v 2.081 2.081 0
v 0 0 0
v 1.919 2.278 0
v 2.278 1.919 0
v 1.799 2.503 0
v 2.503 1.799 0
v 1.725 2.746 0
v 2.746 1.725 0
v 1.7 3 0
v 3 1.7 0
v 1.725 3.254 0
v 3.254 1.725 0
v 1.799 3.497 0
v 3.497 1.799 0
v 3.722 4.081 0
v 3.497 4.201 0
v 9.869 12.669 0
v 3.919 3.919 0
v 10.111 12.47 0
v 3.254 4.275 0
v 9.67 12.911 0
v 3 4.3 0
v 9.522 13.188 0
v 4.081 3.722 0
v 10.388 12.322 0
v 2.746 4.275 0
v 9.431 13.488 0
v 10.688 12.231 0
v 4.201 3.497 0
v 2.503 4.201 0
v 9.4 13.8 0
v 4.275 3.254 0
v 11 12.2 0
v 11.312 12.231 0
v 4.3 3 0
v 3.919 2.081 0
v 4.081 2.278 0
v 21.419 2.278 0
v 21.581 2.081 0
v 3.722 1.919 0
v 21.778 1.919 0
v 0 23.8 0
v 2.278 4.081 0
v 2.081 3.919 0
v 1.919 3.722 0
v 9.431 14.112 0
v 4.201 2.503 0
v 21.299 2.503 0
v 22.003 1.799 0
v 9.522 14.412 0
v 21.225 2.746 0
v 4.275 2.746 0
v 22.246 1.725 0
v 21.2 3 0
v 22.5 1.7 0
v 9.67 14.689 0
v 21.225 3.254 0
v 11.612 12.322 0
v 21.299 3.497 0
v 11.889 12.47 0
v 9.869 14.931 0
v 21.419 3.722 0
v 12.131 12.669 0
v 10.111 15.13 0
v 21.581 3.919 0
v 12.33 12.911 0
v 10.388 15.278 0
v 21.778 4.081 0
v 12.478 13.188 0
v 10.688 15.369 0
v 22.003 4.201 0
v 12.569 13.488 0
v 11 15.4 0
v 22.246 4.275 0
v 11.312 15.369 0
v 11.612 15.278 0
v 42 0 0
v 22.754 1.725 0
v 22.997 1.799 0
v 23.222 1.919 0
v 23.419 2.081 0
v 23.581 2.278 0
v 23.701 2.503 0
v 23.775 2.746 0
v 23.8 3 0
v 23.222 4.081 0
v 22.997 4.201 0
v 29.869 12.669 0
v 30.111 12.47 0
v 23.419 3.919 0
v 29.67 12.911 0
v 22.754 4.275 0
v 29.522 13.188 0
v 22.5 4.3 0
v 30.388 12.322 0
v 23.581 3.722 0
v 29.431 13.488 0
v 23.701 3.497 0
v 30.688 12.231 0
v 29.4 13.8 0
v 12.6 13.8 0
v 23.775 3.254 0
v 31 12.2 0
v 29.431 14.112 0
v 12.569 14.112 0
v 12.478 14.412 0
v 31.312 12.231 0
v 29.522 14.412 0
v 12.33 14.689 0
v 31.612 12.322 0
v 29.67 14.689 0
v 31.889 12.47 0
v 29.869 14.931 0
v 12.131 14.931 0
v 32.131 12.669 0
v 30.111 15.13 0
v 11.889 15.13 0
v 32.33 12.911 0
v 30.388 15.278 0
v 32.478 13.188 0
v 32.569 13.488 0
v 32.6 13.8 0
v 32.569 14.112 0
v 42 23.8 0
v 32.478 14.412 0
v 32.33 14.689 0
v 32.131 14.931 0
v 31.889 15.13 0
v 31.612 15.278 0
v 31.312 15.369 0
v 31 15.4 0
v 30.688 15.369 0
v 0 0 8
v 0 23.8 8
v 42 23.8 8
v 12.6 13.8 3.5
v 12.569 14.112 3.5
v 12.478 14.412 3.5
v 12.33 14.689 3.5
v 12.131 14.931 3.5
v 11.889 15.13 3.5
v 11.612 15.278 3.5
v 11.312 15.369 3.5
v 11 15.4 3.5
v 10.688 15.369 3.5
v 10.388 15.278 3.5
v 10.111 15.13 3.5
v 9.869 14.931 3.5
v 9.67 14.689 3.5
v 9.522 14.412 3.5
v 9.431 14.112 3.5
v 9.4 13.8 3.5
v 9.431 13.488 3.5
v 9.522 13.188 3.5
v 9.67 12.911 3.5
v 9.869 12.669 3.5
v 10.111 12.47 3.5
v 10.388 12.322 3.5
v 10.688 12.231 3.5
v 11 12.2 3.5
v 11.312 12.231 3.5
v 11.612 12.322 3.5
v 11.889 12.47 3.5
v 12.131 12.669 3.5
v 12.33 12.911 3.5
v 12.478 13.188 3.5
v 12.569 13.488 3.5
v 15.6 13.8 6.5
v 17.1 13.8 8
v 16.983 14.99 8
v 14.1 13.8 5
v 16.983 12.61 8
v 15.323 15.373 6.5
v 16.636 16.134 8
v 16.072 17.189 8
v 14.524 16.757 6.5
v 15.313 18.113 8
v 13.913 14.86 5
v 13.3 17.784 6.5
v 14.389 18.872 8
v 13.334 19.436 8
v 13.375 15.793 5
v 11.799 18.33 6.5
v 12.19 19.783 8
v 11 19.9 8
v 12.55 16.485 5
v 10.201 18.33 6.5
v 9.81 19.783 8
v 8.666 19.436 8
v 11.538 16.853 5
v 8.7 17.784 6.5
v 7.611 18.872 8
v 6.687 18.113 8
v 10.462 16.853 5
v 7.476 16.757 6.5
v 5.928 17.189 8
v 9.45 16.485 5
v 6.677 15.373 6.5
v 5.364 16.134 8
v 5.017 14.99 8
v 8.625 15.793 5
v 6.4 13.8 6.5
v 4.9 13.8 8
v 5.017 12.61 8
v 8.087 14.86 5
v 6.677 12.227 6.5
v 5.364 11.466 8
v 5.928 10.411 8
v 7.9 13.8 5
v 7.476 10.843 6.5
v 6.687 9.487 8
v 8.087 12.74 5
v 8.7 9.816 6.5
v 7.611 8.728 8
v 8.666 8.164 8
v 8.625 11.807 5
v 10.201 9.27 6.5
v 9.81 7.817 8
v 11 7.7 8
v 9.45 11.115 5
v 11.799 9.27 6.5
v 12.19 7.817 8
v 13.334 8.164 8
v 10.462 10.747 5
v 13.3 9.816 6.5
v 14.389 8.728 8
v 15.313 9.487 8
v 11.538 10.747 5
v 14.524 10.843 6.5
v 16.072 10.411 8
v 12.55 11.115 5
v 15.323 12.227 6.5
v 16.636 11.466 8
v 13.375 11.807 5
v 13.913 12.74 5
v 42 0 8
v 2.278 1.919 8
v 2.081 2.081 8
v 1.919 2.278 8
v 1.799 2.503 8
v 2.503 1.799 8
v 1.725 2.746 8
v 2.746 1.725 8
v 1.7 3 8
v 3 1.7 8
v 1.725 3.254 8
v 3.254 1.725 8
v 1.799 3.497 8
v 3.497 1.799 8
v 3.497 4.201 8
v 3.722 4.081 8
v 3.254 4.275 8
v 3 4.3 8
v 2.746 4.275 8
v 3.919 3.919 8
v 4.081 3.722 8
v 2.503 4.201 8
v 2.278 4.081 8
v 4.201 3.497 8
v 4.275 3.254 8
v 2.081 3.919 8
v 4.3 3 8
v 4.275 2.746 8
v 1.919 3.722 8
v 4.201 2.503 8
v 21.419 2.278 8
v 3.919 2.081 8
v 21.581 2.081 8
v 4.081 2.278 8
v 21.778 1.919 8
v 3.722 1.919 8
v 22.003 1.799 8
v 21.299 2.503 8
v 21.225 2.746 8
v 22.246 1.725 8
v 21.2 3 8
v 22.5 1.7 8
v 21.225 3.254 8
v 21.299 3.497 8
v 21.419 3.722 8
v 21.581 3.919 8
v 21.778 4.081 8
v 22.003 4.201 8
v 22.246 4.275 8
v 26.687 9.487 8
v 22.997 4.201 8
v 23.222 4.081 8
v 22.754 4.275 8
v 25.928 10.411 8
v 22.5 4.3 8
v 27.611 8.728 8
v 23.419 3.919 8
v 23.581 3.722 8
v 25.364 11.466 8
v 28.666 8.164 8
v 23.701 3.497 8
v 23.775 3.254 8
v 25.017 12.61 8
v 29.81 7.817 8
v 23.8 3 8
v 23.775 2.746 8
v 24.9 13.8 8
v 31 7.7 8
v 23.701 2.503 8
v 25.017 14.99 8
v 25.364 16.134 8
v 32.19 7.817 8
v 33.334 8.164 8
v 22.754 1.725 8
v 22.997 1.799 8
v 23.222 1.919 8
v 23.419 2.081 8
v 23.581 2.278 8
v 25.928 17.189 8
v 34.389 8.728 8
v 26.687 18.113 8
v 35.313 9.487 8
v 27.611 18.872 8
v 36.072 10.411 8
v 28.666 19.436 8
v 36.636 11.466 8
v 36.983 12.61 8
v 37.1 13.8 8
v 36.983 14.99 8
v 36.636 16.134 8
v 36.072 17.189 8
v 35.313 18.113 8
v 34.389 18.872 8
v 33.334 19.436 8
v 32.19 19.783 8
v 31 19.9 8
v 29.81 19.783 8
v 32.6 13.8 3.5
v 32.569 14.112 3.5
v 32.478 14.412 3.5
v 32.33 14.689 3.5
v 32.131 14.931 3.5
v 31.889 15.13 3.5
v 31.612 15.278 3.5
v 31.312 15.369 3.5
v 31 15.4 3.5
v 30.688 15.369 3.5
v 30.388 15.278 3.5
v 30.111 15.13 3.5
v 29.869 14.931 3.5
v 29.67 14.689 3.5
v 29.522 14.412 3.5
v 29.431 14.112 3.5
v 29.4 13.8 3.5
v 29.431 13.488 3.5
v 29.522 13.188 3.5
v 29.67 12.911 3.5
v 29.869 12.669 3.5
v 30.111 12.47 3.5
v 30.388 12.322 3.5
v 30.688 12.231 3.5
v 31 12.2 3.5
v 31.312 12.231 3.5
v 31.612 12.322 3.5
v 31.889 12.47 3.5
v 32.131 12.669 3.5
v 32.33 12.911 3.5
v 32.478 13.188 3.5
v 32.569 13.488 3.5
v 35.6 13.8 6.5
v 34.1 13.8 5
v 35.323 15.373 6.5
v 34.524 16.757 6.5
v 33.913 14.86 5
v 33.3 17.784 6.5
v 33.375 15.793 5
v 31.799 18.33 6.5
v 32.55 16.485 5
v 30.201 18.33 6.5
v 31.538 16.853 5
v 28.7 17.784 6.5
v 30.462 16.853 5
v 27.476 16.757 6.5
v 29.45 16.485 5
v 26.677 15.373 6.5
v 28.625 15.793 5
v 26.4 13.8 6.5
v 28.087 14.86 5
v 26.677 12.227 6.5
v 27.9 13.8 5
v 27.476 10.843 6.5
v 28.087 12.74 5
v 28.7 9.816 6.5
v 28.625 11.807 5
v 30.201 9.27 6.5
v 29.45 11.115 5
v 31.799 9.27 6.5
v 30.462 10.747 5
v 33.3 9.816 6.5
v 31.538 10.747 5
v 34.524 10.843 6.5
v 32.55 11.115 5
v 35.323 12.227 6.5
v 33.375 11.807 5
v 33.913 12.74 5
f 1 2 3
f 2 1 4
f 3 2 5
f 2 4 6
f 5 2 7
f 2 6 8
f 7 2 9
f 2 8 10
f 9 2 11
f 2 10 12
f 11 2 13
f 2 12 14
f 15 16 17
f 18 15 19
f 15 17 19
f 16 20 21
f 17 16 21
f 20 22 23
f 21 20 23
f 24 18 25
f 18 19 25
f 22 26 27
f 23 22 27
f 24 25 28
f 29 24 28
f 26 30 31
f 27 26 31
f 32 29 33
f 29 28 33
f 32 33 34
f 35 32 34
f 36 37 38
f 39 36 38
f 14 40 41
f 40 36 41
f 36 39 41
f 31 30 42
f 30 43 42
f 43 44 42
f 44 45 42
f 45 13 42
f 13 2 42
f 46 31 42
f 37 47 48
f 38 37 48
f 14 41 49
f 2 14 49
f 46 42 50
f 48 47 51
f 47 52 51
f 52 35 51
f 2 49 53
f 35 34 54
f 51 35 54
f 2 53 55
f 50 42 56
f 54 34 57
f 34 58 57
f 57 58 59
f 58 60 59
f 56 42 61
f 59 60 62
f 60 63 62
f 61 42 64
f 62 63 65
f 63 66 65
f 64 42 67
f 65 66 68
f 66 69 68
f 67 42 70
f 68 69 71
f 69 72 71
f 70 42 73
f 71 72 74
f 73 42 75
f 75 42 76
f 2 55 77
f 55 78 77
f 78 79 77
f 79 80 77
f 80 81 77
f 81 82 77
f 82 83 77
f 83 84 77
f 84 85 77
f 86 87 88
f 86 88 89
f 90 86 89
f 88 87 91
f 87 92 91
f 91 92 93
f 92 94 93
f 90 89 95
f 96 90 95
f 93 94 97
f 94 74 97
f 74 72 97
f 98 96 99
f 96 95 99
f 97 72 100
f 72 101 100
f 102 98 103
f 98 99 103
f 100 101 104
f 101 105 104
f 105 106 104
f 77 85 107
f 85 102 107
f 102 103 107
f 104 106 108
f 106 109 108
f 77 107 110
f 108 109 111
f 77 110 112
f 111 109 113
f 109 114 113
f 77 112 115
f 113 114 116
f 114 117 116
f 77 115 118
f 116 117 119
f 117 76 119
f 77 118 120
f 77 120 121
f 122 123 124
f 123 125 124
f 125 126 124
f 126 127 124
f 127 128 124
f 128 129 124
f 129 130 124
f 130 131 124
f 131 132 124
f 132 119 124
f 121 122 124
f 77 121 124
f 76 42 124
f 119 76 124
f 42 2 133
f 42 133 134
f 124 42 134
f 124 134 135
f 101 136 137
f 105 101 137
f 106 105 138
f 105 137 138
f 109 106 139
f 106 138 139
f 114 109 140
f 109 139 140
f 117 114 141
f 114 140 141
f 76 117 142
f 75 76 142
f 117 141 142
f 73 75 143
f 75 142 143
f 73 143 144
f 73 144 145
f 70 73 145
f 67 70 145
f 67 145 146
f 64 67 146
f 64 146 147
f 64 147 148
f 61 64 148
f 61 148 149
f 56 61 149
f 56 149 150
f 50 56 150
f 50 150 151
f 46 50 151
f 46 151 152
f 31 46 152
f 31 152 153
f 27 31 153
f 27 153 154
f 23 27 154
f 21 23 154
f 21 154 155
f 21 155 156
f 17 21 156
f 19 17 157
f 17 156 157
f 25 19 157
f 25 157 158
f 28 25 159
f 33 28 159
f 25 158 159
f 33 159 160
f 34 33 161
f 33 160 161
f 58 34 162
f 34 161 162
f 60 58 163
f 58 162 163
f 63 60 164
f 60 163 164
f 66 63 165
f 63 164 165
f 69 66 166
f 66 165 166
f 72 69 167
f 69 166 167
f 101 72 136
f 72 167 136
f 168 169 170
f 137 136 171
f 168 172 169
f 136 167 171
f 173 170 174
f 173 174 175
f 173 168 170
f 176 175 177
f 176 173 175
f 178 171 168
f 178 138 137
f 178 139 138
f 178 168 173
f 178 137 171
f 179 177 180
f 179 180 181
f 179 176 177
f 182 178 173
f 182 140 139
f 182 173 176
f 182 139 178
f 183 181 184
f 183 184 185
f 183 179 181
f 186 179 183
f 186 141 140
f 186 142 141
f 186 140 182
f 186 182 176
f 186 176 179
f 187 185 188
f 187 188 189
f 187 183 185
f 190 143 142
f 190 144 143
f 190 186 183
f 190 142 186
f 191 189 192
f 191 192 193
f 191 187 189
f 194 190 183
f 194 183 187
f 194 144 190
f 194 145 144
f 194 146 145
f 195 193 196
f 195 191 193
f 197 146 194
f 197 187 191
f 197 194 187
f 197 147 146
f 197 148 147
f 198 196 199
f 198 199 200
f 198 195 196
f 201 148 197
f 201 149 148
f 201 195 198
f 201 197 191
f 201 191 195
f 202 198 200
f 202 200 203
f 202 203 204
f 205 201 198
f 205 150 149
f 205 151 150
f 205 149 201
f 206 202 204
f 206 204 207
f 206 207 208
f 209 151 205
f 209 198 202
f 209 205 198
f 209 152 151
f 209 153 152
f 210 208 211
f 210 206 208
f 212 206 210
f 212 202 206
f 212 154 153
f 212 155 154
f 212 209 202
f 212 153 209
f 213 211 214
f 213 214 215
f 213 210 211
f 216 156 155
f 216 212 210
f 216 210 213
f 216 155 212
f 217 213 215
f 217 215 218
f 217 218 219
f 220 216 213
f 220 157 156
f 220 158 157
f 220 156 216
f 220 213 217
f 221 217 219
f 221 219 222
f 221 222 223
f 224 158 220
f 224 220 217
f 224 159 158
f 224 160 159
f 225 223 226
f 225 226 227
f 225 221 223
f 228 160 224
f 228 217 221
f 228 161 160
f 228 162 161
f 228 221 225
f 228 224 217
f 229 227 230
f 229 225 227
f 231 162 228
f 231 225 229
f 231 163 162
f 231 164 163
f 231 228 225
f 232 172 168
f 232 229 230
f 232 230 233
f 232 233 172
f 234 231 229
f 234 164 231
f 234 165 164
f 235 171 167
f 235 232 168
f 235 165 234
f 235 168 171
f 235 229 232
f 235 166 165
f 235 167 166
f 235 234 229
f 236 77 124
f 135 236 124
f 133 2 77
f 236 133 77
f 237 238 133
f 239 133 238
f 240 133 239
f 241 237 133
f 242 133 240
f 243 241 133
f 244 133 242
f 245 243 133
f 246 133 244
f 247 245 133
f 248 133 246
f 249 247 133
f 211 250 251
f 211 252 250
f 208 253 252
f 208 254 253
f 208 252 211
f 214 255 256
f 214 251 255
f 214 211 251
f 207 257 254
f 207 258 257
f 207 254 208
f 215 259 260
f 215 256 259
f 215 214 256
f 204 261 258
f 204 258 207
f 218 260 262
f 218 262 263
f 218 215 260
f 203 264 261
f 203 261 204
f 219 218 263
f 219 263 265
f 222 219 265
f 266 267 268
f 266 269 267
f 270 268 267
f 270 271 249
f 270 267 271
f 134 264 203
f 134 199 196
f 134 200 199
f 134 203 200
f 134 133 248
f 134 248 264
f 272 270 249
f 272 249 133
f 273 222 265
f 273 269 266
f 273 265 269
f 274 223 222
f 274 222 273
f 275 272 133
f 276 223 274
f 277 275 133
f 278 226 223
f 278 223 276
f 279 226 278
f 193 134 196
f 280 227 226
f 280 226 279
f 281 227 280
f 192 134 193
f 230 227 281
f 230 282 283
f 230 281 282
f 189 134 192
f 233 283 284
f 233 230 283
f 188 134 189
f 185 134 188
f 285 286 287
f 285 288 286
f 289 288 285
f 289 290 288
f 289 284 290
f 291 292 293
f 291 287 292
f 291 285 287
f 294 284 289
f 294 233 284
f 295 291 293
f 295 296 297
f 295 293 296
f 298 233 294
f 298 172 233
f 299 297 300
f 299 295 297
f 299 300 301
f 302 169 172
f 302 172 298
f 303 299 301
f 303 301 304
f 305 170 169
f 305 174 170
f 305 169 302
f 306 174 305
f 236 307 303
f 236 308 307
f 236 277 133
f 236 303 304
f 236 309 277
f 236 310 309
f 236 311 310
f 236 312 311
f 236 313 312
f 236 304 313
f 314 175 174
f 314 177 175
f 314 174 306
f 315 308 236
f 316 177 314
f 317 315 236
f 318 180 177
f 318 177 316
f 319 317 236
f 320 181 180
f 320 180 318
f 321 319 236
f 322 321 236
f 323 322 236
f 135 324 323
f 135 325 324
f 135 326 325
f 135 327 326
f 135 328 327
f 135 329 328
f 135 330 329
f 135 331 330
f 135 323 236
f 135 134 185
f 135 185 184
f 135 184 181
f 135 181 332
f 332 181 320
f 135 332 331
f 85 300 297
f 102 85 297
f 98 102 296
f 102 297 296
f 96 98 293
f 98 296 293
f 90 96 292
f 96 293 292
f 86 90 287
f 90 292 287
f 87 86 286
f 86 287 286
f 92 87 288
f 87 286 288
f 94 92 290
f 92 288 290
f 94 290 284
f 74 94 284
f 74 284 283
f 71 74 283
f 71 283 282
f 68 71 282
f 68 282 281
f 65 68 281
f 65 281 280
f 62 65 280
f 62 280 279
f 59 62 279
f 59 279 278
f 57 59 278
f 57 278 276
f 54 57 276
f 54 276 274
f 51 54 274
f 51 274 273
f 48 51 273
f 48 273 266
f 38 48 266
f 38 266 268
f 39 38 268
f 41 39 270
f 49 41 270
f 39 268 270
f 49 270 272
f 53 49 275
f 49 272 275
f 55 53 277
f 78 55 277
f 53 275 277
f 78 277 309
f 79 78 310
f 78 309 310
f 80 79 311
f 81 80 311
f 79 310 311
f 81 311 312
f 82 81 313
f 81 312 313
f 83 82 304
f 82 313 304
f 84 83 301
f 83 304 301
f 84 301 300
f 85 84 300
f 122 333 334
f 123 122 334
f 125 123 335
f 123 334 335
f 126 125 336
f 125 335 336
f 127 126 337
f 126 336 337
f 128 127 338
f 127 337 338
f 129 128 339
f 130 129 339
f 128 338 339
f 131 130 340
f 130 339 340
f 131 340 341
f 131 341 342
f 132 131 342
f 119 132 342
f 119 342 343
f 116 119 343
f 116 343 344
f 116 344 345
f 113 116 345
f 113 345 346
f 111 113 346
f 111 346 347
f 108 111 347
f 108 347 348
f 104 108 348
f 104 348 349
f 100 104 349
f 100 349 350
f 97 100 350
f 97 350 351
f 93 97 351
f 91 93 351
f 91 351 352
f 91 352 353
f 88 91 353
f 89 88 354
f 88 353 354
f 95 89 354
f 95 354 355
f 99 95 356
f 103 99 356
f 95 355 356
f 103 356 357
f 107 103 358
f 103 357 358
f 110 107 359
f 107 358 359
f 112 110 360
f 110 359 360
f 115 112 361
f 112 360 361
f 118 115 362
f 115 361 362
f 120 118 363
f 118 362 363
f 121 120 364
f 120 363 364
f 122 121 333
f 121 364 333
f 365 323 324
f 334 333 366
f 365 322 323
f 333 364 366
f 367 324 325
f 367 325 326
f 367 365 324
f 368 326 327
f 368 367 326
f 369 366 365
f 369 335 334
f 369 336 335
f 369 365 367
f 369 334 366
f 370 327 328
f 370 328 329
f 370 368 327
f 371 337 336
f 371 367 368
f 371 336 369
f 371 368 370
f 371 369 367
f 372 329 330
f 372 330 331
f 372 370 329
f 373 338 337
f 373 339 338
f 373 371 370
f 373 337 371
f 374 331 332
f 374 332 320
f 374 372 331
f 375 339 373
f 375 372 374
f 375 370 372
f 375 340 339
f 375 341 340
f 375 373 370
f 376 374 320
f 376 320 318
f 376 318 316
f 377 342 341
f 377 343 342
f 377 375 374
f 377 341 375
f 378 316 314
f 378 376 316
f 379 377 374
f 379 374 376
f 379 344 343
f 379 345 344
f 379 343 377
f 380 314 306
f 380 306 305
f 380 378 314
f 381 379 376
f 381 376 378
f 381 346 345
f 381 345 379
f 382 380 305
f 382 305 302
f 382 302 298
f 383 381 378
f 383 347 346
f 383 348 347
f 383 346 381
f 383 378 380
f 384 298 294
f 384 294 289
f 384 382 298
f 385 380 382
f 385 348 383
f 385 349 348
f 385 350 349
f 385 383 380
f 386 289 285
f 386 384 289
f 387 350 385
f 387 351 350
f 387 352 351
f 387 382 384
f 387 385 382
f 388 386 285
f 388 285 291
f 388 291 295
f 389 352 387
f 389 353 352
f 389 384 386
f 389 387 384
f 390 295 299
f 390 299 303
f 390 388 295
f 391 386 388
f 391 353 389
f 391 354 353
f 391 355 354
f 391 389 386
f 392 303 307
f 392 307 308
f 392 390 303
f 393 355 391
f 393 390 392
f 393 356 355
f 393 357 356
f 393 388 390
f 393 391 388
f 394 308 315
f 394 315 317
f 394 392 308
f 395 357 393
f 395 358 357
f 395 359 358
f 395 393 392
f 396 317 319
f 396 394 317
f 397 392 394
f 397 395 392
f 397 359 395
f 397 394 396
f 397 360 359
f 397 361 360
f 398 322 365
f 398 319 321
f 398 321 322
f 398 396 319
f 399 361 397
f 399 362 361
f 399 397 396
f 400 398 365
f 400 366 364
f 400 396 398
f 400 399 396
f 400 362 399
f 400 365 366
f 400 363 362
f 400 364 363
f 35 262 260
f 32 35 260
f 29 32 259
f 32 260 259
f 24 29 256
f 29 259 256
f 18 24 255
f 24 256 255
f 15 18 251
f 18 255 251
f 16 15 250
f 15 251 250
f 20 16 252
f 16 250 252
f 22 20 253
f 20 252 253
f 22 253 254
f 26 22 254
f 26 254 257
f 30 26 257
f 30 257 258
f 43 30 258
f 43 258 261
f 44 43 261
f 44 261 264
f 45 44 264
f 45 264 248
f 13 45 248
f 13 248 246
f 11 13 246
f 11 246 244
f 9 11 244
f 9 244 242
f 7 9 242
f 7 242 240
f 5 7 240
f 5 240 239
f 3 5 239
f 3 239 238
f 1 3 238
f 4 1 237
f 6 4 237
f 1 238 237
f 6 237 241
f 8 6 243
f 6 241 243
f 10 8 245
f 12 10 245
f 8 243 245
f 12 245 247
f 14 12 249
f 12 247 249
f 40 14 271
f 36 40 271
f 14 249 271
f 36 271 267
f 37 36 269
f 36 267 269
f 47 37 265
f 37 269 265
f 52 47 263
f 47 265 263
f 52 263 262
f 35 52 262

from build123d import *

# Parameters (mm, degrees)
SKETCH030_W     = 42
SKETCH030_H     = 23.8
PAD019_DEPTH    = 8
SKETCH032_R     = 1.6
SKETCH032_R_2   = 1.3
POCKET010_DEPTH = 8.001
CHAMFER002_SIZE = 4.5


with BuildPart() as part:
    # Sketch030 → Pad019 (new body)
    with BuildSketch(Plane.XY):
        with Locations((21, 11.9)):
            Rectangle(SKETCH030_W, SKETCH030_H)
    extrude(amount=PAD019_DEPTH)

    # Sketch032 (on Face6 of Pad019) → Pocket010 (cut, through all)
    with BuildSketch(Plane.XY.offset(8)):
        with Locations((11, 13.8)):
            Circle(SKETCH032_R)
        with Locations((31, 13.8)):
            Circle(SKETCH032_R)
        with Locations((3, 3)):
            Circle(SKETCH032_R_2)
        with Locations((22.5, 3)):
            Circle(SKETCH032_R_2)
    extrude(amount=-POCKET010_DEPTH, mode=Mode.SUBTRACT)

    # Chamfer002
    chamfer002_edges = [part.edges().sort_by_distance(p)[0] for p in [
        (9.4, 13.8, 8),
        (29.4, 13.8, 8),
    ]]
    chamfer(chamfer002_edges, length=CHAMFER002_SIZE)


solid = part.part
